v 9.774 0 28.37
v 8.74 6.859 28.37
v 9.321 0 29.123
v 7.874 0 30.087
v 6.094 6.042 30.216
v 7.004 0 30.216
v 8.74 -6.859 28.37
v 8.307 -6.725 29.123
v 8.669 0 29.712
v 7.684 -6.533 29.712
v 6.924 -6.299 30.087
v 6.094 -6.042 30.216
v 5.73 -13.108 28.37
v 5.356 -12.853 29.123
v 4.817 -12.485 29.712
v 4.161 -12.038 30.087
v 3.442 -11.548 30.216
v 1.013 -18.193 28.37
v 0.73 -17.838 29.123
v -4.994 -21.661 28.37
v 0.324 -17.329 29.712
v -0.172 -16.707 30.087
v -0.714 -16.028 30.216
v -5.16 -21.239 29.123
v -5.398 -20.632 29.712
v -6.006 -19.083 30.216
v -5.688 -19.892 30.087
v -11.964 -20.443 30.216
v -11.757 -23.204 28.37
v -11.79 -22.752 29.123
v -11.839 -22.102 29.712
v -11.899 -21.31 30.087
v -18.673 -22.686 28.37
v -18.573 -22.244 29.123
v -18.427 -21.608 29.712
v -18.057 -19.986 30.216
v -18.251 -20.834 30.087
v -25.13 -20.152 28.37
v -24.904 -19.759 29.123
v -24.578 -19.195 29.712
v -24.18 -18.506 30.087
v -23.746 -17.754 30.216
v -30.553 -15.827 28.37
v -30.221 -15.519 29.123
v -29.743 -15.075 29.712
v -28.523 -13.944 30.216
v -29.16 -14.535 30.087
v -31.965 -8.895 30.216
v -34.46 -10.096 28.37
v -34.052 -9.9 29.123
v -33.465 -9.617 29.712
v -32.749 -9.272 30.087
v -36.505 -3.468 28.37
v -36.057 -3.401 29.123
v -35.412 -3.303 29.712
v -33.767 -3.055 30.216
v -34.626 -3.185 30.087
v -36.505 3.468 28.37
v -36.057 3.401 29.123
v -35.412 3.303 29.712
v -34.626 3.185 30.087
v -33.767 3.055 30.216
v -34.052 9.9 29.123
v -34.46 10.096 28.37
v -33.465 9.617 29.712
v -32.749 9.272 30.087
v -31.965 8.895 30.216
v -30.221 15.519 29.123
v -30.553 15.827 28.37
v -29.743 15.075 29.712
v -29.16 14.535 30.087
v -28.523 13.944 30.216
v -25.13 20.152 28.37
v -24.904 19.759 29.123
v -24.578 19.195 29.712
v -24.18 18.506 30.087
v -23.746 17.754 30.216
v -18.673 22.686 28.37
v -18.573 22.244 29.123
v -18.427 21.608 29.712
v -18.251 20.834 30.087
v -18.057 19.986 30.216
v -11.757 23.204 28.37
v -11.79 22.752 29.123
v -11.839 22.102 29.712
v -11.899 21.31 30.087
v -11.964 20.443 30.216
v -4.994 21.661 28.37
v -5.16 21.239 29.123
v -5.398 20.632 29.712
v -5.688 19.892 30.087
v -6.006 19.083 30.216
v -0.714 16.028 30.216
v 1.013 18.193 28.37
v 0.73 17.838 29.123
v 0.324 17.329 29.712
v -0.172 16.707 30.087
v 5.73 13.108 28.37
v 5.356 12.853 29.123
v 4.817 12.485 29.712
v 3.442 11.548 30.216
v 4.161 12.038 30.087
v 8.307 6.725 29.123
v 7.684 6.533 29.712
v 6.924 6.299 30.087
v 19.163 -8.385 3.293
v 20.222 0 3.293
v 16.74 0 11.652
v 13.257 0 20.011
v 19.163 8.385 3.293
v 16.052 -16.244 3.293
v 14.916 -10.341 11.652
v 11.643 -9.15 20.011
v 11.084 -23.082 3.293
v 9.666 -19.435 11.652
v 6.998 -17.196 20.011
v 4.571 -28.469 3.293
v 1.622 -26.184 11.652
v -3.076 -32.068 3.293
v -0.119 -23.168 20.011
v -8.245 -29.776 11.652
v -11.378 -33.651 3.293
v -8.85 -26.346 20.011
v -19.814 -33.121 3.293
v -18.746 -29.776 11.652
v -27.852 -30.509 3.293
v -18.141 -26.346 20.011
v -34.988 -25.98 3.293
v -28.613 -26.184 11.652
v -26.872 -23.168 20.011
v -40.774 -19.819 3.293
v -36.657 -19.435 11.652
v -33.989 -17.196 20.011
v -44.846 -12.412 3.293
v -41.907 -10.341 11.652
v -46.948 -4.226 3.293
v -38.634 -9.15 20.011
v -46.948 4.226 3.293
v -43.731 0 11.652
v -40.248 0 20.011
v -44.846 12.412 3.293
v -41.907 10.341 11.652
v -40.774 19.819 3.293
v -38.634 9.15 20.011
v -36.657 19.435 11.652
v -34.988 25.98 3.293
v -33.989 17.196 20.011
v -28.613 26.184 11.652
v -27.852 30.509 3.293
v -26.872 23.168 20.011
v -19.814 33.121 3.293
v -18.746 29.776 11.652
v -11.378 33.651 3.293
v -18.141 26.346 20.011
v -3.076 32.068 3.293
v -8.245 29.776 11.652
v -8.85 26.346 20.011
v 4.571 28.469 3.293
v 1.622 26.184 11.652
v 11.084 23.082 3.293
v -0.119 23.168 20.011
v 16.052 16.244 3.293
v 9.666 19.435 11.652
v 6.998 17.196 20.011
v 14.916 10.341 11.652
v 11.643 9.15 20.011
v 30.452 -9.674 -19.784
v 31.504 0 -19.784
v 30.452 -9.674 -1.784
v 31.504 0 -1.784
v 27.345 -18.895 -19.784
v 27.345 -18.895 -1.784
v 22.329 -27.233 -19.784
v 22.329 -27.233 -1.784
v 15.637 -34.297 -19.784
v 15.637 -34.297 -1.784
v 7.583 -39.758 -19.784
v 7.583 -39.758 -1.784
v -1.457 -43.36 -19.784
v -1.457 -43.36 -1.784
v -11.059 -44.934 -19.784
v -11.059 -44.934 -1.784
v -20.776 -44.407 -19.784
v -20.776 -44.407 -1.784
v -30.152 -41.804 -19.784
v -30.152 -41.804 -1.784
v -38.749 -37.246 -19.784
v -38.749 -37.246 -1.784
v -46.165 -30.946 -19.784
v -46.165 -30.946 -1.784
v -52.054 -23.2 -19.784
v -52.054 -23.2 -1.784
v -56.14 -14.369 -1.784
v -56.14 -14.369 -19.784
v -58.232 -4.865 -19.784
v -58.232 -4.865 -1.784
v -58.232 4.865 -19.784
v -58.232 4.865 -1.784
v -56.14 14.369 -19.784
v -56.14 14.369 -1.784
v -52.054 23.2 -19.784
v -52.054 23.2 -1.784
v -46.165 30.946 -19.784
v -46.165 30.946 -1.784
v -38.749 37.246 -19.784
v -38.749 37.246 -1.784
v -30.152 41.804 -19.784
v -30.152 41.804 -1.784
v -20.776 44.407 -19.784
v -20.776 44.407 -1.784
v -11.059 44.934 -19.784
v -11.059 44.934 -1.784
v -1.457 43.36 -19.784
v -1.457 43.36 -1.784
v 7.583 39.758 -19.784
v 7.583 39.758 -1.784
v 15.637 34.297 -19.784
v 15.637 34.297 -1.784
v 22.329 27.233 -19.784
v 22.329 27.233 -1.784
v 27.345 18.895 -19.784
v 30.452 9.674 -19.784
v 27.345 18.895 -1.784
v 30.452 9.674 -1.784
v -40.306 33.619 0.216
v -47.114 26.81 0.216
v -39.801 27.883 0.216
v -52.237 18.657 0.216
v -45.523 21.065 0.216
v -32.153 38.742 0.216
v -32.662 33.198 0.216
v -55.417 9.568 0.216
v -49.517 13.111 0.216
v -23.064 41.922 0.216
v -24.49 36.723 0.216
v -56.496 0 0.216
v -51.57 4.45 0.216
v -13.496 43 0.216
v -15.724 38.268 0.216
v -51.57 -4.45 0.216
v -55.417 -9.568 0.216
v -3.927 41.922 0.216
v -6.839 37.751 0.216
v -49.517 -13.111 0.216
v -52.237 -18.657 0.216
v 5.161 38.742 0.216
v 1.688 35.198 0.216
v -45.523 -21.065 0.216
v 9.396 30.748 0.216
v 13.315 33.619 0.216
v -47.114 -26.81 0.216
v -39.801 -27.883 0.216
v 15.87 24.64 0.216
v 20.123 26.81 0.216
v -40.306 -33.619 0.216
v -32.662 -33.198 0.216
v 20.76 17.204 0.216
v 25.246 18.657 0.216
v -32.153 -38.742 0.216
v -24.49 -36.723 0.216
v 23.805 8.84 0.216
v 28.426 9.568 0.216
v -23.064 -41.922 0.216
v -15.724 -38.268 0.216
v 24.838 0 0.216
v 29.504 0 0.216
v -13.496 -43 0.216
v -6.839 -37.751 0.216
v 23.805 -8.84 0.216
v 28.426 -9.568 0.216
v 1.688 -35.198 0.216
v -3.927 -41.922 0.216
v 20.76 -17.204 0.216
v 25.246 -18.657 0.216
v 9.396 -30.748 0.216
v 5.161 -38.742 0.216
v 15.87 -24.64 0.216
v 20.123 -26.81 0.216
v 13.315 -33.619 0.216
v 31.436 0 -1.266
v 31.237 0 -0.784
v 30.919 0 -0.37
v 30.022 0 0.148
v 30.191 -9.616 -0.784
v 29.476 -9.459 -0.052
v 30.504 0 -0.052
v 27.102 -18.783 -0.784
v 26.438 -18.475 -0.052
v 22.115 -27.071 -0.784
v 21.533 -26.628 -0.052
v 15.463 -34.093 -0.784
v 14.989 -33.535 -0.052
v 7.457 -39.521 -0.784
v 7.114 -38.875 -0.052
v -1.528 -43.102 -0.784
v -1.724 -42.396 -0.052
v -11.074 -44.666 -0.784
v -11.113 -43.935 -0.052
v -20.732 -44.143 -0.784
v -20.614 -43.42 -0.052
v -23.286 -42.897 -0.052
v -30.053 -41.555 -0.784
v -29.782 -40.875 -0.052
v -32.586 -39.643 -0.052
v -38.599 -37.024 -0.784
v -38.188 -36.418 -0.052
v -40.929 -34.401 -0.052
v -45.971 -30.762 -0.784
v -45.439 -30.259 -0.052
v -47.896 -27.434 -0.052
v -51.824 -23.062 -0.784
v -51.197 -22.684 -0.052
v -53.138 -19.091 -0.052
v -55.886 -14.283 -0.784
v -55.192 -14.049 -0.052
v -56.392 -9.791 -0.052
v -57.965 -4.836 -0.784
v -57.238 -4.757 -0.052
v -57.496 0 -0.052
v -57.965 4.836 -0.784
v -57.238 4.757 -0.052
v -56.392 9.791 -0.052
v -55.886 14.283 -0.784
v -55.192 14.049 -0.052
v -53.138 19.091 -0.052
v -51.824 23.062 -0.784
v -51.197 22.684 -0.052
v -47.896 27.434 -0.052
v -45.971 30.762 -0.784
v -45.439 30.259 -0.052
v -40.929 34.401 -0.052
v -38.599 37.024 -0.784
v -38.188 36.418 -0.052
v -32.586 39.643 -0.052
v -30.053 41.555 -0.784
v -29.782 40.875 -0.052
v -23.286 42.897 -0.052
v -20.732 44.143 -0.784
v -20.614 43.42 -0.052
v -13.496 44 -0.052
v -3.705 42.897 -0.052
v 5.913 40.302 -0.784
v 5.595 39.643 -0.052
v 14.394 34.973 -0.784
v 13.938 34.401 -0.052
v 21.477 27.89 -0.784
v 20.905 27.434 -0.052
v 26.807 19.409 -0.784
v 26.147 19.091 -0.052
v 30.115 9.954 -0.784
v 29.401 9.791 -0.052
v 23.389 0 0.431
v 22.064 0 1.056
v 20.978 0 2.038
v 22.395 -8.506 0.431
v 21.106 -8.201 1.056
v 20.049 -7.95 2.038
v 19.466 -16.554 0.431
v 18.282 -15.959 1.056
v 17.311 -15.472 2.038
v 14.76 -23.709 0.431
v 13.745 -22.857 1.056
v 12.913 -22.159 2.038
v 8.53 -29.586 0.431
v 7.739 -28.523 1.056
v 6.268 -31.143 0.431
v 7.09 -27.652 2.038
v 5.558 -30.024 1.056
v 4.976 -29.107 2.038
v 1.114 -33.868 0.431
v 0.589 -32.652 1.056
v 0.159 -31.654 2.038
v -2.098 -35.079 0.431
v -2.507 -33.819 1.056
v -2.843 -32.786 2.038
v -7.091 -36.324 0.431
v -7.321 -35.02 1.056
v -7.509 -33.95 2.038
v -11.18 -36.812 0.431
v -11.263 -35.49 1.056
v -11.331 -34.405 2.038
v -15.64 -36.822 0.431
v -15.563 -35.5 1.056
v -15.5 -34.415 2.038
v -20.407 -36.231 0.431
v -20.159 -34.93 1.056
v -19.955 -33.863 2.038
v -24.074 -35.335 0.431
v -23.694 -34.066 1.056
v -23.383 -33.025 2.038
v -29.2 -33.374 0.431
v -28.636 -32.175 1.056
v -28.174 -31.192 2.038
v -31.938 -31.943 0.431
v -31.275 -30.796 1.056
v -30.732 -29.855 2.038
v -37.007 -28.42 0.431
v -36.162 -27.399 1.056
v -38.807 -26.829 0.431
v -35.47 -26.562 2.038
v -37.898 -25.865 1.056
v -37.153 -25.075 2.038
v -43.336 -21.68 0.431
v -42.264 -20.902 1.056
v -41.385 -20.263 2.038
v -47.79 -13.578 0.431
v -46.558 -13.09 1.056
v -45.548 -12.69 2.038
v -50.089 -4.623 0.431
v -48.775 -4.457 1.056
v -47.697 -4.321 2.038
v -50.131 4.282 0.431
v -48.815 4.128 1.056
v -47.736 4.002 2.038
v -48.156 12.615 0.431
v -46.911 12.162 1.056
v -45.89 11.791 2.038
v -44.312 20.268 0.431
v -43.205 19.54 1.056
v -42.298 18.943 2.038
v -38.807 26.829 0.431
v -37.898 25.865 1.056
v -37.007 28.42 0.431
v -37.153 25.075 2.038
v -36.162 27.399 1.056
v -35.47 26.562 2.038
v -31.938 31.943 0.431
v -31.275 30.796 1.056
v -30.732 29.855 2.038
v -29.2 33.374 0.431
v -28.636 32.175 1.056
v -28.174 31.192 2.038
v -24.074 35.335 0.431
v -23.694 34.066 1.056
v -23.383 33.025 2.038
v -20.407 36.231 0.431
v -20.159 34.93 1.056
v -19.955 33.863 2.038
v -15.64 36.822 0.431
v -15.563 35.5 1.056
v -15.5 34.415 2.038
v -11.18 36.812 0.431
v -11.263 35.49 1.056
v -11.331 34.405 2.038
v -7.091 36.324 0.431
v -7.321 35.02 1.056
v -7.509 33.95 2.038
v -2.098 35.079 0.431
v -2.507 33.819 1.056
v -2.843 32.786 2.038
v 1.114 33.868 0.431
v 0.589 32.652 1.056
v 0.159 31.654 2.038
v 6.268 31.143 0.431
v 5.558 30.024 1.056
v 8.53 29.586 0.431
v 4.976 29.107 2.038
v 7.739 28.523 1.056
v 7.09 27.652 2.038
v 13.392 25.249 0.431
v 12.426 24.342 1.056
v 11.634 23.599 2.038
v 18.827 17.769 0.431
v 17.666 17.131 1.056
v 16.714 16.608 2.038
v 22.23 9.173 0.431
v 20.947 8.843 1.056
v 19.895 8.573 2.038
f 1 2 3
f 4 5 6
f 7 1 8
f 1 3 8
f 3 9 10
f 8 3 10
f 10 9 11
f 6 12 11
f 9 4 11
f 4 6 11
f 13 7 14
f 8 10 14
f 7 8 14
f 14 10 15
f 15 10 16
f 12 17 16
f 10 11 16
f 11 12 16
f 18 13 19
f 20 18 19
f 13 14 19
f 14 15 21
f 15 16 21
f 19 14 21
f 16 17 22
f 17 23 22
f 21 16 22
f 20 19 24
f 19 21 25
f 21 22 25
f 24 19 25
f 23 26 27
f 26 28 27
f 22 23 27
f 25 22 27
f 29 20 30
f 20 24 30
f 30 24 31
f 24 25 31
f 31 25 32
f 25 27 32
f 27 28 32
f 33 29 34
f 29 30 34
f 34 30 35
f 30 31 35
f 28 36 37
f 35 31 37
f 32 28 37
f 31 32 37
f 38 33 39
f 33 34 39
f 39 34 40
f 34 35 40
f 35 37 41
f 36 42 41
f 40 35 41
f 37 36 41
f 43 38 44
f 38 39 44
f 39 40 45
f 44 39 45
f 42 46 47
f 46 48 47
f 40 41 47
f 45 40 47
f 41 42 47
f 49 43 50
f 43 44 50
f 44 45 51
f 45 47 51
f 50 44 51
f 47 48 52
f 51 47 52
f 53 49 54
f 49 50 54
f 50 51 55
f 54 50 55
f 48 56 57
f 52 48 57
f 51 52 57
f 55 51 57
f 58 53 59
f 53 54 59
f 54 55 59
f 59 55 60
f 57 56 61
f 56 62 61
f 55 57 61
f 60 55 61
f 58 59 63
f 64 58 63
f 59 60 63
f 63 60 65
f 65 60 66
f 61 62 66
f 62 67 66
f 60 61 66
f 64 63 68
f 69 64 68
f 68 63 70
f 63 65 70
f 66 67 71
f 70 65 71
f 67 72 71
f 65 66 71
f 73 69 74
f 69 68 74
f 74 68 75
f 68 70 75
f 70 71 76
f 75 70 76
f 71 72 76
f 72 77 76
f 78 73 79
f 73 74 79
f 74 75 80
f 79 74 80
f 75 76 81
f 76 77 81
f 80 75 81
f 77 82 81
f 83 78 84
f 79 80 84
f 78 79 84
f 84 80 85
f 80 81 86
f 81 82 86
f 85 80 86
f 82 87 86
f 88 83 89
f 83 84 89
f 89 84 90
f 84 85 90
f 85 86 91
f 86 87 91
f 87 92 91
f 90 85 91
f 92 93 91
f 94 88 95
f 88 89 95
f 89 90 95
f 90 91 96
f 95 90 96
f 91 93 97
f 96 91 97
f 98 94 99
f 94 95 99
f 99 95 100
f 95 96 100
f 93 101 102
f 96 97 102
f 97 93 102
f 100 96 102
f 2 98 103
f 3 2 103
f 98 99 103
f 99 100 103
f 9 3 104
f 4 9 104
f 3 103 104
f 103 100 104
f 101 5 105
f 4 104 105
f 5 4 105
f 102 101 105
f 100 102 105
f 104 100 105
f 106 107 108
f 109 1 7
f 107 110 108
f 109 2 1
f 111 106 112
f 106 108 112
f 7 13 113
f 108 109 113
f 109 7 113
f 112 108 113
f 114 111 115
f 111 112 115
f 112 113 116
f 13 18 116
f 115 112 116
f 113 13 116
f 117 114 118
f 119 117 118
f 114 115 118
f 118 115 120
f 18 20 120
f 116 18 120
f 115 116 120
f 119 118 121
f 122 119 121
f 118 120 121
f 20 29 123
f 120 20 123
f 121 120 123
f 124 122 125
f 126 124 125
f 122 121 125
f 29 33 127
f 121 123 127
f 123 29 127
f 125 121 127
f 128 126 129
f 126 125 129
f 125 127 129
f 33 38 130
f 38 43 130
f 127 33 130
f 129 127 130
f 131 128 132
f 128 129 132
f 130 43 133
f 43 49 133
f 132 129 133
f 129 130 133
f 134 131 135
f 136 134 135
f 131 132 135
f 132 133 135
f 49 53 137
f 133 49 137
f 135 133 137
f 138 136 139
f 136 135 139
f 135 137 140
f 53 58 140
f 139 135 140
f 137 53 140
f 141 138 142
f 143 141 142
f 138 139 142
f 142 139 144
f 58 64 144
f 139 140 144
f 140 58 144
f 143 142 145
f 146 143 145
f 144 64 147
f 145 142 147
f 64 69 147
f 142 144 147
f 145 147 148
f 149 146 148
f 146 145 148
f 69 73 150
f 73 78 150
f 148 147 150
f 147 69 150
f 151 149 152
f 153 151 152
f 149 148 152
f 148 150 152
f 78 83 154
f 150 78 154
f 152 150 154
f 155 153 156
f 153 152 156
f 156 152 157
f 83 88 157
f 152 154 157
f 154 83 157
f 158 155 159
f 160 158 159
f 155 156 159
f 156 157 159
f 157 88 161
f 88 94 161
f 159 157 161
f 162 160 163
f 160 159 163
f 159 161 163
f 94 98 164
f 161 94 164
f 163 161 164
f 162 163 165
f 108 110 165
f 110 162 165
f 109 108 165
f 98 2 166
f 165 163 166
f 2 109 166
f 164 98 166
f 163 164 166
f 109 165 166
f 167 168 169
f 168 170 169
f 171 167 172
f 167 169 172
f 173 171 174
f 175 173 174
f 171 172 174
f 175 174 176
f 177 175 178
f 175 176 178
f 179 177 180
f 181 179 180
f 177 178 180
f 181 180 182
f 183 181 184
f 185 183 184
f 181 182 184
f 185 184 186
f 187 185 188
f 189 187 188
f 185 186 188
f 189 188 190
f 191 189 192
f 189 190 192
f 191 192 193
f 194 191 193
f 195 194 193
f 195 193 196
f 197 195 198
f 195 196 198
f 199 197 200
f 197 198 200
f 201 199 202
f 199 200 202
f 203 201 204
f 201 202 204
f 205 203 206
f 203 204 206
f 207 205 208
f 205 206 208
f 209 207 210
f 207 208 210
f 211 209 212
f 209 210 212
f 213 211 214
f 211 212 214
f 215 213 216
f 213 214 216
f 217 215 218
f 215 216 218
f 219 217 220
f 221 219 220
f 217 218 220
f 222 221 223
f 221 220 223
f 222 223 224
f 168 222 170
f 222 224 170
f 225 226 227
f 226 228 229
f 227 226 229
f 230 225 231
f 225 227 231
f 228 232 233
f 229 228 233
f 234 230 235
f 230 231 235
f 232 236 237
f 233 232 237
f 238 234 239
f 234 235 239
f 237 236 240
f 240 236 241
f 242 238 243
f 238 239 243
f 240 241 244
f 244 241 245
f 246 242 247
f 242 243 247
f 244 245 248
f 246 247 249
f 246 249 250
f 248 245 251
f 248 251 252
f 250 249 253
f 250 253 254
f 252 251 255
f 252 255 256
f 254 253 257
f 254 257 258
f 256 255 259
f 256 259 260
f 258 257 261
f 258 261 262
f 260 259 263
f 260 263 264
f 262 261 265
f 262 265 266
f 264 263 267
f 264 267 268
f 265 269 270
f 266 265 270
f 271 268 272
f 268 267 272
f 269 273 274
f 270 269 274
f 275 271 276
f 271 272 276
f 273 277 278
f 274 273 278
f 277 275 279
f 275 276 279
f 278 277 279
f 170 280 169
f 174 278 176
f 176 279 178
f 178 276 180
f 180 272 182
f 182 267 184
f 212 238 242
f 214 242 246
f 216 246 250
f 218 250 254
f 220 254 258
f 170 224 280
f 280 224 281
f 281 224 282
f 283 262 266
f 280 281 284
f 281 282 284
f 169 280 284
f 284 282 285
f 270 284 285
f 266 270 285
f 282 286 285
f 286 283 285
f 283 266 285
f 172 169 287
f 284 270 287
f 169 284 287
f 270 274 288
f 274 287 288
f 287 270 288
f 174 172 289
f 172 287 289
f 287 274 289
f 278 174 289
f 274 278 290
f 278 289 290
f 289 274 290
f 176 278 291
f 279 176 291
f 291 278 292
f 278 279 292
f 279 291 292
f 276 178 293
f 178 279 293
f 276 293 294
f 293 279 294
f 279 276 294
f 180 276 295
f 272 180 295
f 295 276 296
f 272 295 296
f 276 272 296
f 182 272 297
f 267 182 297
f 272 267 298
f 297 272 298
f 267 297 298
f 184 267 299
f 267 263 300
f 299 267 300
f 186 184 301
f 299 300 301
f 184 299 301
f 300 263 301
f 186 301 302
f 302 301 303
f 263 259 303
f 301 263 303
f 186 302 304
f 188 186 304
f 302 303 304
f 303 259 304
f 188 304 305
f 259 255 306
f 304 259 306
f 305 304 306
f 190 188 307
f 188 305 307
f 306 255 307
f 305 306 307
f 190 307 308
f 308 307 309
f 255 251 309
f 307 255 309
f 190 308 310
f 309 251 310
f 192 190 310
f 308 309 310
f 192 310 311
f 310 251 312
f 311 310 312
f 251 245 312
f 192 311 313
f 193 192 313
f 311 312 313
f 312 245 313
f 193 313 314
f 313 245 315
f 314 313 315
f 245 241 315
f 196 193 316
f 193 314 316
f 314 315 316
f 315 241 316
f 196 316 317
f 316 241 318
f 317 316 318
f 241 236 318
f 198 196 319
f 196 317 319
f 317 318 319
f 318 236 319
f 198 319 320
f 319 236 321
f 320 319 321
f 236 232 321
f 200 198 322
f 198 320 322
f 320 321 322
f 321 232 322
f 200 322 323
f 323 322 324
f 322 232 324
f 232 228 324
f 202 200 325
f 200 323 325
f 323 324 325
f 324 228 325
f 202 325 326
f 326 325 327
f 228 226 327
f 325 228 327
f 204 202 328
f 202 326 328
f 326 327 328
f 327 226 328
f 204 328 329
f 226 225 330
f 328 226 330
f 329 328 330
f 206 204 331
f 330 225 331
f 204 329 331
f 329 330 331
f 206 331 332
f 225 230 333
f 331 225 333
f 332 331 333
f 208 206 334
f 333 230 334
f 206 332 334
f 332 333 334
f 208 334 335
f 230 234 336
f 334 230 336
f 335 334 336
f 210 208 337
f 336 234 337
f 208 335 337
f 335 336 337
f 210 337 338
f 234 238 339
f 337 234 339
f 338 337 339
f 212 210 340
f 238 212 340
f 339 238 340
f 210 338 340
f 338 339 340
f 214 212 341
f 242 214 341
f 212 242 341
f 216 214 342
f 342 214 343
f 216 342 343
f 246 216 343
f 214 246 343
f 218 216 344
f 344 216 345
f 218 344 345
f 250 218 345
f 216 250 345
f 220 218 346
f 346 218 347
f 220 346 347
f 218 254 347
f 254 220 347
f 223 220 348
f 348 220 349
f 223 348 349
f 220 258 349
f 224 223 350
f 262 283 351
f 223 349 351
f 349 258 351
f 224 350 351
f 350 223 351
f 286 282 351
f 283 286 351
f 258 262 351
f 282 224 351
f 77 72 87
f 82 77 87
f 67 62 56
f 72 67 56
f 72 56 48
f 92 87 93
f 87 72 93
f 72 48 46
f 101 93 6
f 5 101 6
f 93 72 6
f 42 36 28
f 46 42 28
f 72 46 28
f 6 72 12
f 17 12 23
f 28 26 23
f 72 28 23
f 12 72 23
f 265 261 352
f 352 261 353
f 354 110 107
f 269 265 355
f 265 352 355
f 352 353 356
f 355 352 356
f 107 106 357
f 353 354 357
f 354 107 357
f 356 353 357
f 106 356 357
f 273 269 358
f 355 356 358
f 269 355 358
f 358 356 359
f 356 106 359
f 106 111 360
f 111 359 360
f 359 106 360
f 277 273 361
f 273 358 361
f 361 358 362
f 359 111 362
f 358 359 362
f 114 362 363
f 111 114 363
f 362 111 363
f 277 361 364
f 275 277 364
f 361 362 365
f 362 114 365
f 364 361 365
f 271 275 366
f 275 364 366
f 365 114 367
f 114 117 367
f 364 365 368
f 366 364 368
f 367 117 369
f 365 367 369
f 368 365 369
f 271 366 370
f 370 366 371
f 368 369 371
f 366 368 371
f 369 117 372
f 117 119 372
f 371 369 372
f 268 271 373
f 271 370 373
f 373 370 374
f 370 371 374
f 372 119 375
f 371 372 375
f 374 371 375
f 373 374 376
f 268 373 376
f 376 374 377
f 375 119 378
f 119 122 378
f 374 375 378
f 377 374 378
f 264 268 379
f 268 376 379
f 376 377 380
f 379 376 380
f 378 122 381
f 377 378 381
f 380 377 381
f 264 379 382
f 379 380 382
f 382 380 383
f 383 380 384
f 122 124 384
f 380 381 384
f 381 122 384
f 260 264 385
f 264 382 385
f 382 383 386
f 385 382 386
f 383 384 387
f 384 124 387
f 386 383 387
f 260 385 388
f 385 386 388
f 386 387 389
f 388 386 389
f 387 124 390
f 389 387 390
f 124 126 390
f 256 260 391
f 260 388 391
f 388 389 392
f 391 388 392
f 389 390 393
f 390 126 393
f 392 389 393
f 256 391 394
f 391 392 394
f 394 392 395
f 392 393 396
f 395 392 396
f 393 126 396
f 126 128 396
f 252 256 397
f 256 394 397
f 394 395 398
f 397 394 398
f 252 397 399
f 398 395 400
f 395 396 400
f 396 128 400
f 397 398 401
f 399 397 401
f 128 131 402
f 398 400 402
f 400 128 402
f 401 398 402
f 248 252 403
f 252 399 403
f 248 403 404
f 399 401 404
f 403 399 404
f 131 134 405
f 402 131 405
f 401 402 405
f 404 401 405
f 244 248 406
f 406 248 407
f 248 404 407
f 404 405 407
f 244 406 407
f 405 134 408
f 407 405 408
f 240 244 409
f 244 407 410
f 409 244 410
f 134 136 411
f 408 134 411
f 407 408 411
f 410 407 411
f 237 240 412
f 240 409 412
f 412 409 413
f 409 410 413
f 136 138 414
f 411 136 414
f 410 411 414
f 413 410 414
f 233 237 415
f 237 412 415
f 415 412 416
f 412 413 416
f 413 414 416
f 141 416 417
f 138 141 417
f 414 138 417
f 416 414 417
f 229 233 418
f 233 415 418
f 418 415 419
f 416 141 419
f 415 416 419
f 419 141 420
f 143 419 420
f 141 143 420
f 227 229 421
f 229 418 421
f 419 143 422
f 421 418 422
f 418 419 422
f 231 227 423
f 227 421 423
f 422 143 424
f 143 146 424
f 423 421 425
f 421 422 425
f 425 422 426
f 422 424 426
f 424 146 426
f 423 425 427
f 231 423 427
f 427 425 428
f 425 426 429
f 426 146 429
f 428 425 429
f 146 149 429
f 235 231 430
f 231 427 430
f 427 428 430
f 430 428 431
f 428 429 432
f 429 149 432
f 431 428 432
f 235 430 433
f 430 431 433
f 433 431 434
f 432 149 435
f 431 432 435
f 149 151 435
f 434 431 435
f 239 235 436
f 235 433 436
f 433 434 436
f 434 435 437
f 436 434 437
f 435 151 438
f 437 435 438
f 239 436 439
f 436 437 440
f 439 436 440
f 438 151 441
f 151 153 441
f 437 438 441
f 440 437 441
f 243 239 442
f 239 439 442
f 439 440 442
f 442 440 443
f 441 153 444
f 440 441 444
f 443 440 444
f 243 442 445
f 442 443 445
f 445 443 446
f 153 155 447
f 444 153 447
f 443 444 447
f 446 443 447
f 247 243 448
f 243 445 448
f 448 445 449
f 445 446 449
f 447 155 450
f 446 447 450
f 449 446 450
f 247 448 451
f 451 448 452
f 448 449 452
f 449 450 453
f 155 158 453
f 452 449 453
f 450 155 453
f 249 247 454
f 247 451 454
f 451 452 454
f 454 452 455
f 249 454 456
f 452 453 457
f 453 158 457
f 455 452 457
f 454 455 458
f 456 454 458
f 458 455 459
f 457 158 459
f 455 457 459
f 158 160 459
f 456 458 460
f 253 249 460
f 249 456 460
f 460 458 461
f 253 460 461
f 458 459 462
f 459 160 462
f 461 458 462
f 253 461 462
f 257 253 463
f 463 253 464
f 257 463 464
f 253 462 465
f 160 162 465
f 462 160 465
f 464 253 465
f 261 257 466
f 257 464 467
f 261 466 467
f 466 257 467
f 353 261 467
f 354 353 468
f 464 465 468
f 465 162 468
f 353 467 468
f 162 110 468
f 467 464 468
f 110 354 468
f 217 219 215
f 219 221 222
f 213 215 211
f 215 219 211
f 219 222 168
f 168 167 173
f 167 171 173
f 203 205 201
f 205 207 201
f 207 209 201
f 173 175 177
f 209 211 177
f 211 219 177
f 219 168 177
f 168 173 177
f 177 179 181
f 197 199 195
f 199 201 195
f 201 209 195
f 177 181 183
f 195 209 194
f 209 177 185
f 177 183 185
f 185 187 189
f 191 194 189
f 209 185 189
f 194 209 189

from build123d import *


with BuildPart() as f1:
    # F0 (on Front) → F1 (revolve)
    with BuildSketch(Plane.XZ):
        with BuildLine():
            Line((-13.495519, -19.783843), (31.504481, -19.783843))
            Line((31.504481, -19.783843), (31.504481, -1.783843))
            ThreePointArc((31.504481, -1.783843), (30.918695, -0.369629), (29.504481, 0.216157))
            Line((29.504481, 0.216157), (24.837814, 0.216157))
            ThreePointArc((24.837814, 0.216157), (22.064313, 1.055906), (20.22243, 3.29308))
            Line((20.22243, 3.29308), (9.773712, 28.370003))
            ThreePointArc((9.773712, 28.370003), (8.668582, 29.712308), (7.004481, 30.216157))
            Line((7.004481, 30.216157), (-13.495519, 30.216157))
            Line((-13.495519, 30.216157), (-13.495519, -19.783843))
        make_face()
    revolve(axis=Axis((-13.495519, 0, 5.240102), (0, 0, -1)))


solid = f1.part
